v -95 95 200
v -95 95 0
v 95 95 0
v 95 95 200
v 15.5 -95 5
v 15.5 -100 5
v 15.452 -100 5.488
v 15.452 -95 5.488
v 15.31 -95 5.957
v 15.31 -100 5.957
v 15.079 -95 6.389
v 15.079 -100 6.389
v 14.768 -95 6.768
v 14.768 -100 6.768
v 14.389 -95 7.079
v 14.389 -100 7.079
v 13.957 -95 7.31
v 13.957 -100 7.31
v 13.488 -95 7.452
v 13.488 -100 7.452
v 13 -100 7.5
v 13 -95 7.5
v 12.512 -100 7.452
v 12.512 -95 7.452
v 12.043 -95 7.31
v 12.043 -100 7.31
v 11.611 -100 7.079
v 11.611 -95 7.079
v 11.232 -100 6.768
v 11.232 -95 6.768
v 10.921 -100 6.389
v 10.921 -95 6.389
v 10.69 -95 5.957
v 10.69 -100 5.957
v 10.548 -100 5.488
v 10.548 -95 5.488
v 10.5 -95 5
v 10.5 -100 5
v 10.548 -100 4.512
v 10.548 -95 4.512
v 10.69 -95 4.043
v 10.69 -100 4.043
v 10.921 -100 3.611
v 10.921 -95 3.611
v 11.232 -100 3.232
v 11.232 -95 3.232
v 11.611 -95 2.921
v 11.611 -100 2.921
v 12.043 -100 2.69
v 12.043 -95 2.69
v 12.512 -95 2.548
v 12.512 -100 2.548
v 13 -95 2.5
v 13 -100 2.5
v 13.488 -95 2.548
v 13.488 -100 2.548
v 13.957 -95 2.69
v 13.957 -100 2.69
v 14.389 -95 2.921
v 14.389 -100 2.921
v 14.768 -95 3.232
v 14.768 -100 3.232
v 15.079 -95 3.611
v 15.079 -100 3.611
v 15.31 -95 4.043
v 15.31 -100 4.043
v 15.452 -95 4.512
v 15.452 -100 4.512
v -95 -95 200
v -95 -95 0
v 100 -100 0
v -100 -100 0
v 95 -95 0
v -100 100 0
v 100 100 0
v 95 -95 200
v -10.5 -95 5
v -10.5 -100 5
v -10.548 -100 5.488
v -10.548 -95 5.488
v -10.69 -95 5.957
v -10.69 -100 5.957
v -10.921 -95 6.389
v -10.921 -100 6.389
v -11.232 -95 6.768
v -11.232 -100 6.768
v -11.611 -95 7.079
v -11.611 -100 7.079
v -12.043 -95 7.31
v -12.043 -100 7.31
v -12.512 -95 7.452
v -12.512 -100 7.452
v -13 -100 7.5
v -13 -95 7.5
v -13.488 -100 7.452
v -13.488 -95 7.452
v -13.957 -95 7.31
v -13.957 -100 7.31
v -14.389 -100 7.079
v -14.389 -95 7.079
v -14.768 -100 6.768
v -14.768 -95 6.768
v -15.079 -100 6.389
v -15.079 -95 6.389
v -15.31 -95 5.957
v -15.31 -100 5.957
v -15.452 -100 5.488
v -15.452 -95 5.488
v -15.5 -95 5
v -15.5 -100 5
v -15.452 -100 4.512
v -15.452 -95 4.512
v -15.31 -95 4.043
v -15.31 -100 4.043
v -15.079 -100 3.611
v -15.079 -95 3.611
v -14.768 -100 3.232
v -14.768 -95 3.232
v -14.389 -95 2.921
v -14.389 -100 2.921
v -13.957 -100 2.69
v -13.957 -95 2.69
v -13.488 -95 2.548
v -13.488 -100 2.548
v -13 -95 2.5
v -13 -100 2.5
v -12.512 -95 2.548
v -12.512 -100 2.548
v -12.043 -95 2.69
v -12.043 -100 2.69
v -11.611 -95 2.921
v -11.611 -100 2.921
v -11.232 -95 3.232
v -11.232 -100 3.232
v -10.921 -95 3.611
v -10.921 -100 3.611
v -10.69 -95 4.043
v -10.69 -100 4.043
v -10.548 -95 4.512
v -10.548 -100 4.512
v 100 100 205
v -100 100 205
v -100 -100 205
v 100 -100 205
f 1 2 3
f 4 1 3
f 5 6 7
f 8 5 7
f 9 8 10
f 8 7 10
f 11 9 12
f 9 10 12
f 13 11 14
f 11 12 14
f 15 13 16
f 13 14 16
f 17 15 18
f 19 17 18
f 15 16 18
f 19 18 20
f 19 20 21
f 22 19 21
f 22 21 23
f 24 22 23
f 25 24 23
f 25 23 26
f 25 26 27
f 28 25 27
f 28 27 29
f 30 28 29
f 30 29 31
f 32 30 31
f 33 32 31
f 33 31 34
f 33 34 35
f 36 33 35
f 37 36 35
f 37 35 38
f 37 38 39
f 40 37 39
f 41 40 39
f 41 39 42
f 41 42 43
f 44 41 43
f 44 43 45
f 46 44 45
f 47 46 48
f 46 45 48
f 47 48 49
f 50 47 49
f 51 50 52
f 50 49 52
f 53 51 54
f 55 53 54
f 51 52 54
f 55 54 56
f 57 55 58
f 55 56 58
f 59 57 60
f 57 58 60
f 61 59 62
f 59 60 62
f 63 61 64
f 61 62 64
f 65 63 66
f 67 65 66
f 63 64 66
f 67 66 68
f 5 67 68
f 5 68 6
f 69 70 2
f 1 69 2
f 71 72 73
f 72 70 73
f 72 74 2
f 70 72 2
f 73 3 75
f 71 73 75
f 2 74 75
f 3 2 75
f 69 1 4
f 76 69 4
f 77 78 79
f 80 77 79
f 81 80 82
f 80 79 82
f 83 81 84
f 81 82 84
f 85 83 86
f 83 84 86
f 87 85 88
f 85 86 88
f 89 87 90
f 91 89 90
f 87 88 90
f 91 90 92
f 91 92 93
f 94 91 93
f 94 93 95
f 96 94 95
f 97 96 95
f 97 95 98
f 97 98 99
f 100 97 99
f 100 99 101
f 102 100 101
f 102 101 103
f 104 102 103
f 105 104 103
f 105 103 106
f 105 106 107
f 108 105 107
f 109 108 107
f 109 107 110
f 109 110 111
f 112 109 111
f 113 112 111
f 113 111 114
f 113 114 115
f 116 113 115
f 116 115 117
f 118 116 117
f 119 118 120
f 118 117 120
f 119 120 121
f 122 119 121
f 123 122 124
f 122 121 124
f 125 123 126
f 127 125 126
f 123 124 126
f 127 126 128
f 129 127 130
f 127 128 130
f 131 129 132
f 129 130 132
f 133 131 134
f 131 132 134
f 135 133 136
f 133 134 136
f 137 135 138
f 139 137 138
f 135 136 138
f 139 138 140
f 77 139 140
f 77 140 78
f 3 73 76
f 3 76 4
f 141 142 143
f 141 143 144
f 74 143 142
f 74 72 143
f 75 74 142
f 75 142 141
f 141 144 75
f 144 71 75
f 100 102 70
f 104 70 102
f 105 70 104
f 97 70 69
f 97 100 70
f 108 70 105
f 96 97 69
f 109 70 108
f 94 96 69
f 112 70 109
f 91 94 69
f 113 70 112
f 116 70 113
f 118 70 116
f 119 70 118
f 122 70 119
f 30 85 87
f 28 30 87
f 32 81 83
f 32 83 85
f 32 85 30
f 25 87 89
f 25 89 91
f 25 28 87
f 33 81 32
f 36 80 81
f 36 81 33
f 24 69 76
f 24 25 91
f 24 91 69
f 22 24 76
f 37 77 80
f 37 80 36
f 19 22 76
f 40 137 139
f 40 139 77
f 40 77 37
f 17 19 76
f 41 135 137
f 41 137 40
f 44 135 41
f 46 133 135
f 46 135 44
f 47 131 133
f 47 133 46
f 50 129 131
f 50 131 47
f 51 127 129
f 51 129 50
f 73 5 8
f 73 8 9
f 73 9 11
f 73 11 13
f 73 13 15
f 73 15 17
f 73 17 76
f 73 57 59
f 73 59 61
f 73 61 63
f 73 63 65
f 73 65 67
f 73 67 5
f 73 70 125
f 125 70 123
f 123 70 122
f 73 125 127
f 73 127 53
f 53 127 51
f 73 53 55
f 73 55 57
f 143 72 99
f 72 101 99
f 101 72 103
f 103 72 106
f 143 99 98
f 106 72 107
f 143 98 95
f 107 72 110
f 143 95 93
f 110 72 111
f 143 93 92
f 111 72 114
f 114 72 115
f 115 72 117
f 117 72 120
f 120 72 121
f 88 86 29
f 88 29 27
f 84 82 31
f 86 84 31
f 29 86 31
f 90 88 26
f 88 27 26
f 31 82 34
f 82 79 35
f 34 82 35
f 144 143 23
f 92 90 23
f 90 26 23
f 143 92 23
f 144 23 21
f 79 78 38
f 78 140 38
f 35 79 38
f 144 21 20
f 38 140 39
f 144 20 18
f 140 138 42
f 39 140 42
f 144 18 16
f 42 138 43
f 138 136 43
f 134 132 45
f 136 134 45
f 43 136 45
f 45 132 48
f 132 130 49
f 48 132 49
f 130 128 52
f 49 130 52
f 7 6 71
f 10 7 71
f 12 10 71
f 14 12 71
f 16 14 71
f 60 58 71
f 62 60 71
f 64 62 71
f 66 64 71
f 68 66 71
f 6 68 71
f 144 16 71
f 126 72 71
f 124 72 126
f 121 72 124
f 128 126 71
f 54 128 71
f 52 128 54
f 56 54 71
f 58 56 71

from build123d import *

# Parameters (mm, degrees)
SKETCH1_W           = 200
SKETCH1_H           = 200
SKETCH1_W_2         = 190
SKETCH1_H_2         = 190
BOSS_EXTRUDE1_DEPTH = 200
SKETCH2_W           = 200
SKETCH2_H           = 200
BOSS_EXTRUDE2_DEPTH = 5
SKETCH3_R           = 2.5
CUT_EXTRUDE1_DEPTH  = 6


with BuildPart() as part:
    # Sketch1 → Boss-Extrude1 (new body)
    with BuildSketch(Plane.XY):
        Rectangle(SKETCH1_W, SKETCH1_H)
        Rectangle(SKETCH1_W_2, SKETCH1_H_2, mode=Mode.SUBTRACT)
    extrude(amount=BOSS_EXTRUDE1_DEPTH)

    # Sketch2 → Boss-Extrude2 (add)
    with BuildSketch(Plane.XY.offset(200)):
        Rectangle(SKETCH2_W, SKETCH2_H)
    extrude(amount=BOSS_EXTRUDE2_DEPTH)

    # Sketch3 → Cut-Extrude1 (cut)
    with BuildSketch(Plane.XZ.offset(100)):
        with Locations((13, 5)):
            Circle(SKETCH3_R)
        with Locations((-13, 5)):
            Circle(SKETCH3_R)
    extrude(amount=-CUT_EXTRUDE1_DEPTH, mode=Mode.SUBTRACT)


solid = part.part
